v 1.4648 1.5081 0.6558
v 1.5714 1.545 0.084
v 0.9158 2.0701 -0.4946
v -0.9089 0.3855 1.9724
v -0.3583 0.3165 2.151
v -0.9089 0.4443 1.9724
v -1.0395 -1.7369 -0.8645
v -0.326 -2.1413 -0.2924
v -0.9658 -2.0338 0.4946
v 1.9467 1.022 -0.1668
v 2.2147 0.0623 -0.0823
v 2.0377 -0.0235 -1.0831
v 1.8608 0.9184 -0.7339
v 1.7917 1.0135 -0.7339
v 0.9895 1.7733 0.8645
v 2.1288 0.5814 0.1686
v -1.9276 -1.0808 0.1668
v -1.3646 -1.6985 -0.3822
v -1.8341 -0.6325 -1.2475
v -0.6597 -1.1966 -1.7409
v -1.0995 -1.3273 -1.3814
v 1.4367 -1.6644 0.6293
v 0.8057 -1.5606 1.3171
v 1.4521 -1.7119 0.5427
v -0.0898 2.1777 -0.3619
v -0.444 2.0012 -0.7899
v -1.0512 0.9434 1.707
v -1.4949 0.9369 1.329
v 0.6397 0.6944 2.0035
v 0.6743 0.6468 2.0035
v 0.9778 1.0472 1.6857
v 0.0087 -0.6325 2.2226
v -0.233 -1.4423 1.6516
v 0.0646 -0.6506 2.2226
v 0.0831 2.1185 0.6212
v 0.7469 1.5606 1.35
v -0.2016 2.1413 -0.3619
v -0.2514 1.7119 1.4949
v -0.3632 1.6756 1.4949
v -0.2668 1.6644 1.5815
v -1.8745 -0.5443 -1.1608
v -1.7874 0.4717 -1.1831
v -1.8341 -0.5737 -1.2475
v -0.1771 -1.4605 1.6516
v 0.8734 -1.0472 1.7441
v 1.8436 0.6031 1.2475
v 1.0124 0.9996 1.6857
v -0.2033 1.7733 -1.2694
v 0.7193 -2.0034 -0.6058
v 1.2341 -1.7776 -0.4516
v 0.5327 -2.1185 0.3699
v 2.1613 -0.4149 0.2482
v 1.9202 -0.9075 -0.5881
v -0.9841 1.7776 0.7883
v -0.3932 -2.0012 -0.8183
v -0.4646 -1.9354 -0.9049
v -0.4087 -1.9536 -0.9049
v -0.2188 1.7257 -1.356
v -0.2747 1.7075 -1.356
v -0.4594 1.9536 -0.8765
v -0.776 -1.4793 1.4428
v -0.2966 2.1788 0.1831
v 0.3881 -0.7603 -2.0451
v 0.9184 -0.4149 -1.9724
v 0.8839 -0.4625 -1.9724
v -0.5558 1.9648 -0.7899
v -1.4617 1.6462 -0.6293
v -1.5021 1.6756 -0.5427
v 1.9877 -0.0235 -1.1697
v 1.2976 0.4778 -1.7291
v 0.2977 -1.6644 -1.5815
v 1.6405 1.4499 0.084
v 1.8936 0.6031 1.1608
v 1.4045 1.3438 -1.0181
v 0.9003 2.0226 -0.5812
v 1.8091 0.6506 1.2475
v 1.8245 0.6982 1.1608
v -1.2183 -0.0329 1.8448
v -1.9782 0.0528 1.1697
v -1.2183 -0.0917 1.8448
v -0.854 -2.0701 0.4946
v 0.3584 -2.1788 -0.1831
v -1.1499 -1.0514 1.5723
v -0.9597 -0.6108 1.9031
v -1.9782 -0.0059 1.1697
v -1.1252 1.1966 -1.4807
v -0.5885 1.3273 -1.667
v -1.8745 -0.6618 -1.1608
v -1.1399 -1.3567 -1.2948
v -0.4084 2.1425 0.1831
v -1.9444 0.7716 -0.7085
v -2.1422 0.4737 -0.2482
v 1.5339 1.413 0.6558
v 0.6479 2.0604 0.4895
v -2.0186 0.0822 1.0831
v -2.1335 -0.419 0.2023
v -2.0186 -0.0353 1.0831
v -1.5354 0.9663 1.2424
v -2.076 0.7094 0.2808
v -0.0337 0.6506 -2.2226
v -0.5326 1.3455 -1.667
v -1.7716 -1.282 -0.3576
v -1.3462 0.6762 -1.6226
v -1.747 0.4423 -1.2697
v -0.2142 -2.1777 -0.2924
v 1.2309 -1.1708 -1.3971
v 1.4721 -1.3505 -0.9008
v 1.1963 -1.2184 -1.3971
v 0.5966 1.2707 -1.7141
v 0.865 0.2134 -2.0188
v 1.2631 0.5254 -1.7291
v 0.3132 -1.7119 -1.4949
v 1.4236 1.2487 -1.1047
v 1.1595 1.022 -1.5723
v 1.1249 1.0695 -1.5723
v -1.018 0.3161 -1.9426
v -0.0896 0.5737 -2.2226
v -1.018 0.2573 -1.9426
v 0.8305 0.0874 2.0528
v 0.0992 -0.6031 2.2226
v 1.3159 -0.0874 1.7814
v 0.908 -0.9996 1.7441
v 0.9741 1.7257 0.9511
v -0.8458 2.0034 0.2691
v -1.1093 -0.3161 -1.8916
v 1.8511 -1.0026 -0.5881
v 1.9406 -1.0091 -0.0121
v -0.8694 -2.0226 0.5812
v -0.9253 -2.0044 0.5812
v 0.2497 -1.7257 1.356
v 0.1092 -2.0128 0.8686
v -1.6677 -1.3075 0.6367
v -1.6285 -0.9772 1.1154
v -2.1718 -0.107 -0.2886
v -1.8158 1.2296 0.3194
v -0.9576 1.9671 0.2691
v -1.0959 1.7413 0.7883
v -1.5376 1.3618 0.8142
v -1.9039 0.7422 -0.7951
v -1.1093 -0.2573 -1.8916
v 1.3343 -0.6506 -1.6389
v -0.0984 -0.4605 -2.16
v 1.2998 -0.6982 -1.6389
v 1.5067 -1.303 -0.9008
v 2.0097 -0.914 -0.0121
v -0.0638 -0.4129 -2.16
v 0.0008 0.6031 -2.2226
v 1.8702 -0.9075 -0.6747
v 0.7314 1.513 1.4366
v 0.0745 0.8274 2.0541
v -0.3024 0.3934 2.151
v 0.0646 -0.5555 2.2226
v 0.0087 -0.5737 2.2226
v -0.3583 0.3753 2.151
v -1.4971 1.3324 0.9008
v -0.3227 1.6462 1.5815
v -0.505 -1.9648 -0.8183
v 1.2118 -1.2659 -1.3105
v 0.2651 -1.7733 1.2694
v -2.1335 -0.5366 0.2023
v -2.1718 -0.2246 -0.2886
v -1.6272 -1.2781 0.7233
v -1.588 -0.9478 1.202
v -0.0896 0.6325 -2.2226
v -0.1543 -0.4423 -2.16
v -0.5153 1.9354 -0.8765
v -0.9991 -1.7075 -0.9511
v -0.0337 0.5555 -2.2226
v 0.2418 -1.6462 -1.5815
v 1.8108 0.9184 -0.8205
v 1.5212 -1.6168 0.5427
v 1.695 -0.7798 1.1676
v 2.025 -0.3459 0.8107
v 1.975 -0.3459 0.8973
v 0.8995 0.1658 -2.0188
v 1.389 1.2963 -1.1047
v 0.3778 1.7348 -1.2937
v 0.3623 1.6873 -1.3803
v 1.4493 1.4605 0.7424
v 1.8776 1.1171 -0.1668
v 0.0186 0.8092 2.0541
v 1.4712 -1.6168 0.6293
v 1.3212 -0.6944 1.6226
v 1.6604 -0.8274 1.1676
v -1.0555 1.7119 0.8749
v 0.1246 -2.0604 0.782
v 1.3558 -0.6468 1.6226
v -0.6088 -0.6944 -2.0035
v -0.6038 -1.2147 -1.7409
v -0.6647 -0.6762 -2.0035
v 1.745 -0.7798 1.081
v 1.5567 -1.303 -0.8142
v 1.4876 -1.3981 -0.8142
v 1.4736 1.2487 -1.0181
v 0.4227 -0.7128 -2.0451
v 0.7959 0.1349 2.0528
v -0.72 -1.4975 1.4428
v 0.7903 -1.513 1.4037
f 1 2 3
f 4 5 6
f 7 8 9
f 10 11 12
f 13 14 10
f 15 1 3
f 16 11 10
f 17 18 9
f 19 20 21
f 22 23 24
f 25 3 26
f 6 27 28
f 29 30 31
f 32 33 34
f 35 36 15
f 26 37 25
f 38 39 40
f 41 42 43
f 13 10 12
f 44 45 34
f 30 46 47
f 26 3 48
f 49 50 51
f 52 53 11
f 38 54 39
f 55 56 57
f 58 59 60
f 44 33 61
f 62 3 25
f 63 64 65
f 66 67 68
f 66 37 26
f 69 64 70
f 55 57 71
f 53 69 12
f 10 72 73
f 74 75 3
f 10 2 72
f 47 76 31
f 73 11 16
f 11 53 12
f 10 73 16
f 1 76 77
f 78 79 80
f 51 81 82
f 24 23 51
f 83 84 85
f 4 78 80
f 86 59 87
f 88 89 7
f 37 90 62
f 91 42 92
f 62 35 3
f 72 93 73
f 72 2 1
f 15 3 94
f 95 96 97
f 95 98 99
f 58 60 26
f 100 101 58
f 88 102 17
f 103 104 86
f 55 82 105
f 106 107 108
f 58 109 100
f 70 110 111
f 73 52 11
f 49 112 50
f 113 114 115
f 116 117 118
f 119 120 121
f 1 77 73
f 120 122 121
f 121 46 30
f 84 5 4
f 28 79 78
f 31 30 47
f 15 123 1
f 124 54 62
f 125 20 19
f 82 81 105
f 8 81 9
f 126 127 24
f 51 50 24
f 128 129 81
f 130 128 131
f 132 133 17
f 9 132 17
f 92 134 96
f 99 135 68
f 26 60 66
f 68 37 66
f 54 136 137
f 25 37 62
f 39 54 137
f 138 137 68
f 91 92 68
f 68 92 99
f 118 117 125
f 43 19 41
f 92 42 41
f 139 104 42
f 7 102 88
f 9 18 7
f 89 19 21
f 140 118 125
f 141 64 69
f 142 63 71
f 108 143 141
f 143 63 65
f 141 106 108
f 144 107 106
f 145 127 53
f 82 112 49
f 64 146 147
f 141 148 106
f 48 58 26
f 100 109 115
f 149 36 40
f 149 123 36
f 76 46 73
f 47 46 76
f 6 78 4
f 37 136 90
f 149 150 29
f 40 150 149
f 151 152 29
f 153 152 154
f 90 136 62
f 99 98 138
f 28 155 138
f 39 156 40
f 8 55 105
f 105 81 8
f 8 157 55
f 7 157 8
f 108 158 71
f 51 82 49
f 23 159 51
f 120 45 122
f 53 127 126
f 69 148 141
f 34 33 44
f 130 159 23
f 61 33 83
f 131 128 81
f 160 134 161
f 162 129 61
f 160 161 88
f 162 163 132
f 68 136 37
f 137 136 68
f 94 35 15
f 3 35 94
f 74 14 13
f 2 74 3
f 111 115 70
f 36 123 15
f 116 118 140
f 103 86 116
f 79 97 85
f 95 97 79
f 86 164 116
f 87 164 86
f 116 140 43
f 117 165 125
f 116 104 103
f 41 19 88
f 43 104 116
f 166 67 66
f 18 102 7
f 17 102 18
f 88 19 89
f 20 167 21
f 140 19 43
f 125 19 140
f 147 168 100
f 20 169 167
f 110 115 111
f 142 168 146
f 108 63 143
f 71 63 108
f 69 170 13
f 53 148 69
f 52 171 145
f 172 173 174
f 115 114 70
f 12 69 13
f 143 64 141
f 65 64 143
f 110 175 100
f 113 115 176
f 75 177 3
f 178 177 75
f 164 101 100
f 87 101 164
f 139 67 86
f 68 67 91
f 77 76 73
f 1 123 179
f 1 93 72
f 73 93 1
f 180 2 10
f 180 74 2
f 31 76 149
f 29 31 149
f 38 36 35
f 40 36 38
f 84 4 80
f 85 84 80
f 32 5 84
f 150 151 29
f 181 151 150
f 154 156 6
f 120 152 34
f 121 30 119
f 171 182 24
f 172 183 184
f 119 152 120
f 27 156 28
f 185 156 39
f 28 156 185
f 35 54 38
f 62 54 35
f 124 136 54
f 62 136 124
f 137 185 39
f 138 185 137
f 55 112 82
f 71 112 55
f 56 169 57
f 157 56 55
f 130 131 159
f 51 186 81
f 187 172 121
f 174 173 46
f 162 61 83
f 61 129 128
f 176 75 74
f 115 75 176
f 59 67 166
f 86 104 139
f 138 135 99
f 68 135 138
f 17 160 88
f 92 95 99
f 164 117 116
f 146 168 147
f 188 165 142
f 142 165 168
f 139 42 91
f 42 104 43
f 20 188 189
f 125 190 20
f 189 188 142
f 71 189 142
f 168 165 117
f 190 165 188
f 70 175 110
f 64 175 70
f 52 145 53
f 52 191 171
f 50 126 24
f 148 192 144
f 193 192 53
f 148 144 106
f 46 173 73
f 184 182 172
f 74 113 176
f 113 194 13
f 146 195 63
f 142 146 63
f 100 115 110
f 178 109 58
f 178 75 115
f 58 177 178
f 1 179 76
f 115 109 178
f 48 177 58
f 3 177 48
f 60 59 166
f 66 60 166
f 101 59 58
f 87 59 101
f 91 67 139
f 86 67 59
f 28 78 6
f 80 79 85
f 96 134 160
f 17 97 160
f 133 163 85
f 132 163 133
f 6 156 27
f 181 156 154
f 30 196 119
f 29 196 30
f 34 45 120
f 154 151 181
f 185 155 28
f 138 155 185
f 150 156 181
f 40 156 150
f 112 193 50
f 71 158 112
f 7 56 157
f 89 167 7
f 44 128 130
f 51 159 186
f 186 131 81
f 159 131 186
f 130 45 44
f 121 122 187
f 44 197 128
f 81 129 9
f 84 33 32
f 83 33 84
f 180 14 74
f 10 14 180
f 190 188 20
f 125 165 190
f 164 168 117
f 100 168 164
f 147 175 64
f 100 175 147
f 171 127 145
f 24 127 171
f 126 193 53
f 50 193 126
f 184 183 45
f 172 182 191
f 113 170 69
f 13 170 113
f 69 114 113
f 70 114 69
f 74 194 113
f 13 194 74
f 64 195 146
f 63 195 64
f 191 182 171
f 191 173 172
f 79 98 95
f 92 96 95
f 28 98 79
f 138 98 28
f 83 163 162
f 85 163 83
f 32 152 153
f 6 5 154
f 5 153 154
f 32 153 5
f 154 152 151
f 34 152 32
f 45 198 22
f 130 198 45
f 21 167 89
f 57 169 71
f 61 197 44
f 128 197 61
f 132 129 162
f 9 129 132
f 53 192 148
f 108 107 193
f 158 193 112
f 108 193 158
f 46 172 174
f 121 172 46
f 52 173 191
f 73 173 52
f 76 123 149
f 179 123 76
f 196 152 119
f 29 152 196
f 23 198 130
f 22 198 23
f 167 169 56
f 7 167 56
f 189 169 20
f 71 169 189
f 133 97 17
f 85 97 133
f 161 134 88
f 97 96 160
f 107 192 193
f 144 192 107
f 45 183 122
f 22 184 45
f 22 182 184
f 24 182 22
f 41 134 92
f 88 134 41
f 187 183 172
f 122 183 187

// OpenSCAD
// Auto-generated OpenSCAD file

    inner_points = [[0.8579796441232708, -0.9996404489940665, 1.6574581918866056], [-1.0847386016059772, 1.167184379355083, -1.3941307491129977], [0.7748474244999852, -1.4654565366556, 1.3170521488407676], [-0.5480884670172788, 1.2979126062945836, -1.5803795916143755], [-1.0107543103972276, 0.9139857219760192, 1.6203652609471635], [-1.4544672778702694, 0.9074766744572665, 1.242412482940991], [1.180871812766946, -1.1708139864972764, -1.310463324813721], [1.2843497755005513, -0.6506484099360094, -1.5523144190744336], [1.433879238504469, 1.4129540896823205, 0.6558420729739887], [-1.6907204848573856, -1.223183452303766, -0.35758109421614703], [-1.2836865882402133, -1.6397015858181634, -0.3822371089841631], [1.54052783459313, 1.4499309484396088, 0.08397613022632147], [1.305769091672327, -0.646800027074129, 1.5359669785047796], [-0.23423381422719303, 1.6781592990996514, -1.2694461949861906], [0.23423381422719303, -1.6781592990996514, 1.2694461949861906], [-1.305769091672327, 0.646800027074129, -1.5359669785047796], [-0.8684240390048409, 0.41492955636205053, 1.8858024569351586], [-1.4566528062848514, 1.3029849964993816, 0.8142299771483135], [1.4566528062848514, -1.3029849964993816, -0.8142299771483135], [0.8684240390048409, -0.41492955636205053, -1.8858024569351586], [0.9586077240253138, 1.678159299100078, 0.8645405445263475], [-1.8467080524705957, -1.0219743296750887, 0.16678007456642885], [1.8467080524705957, 1.0219743296750887, -0.16678007456642885], [-0.9586077240253138, -1.678159299100078, -0.8645405445263475], [0.04918492172195882, -0.6030673945114334, 2.135952636513539], [-1.421213547504029, 1.61680934800795, -0.5426625920973938], [1.421213547504029, -1.61680934800795, 0.5426625920973938], [-0.04918492172195882, 0.6030673945114334, -2.135952636513539], [-0.2822855849940039, 1.6168093480083572, 1.4948730665090353], [-1.9377033650591966, 0.023459588570722167, 1.0831243792931171], [1.9377033650591966, -0.023459588570722167, -1.0831243792931171], [0.2822855849940039, -1.6168093480083572, -1.4948730665090353], [1.7936392323569286, 0.6030673945120921, 1.1608493124015653], [0.8848830013694515, 1.9750266722244698, -0.49462594166306073], [-0.8848830013694515, -1.9750266722244698, 0.49462594166306073], [-1.7936392323569286, -0.6030673945120921, -1.1608493124015653], [-0.1925143734426863, -1.4129540896818769, 1.5649526227065784], [-0.4748715378173711, 1.9060612193025719, -0.7899401279139628], [1.6449700533810556, -0.7798342264897309, 1.0809763445708047], [-0.9775841421209983, 0.286727096869036, -1.8559888393634203], [-1.1778980317856296, -0.06226494218894019, 1.758197104575229], [-1.0150011226881364, 1.6825182159935905, 0.788341885629921], [1.8202339603303983, -0.9074766744571358, -0.5880579646795898], [0.3726651941433674, -0.7127765993475144, -1.95848102552556], [-1.586794026674212, -1.248721825810892, 0.6366759564342929], [0.6170033927502129, 1.965264785077761, 0.48950882802556095], [2.0288337144286324, 0.5813696470282894, 0.16858483786773926], [-1.0590430805046331, -1.2979126062951583, -1.294769622327593], [1.2658949203529903, -0.08738587161821454, 1.6948308219149752], [-1.7065218741303412, 0.412949070877893, -1.183145769895968], [0.09373659686164326, -1.965264785077507, 0.7820009781260046], [0.3468903569157078, 1.6397015858178283, -1.293686030145012], [-0.31788214871213094, 0.3458914437357179, 2.0644340152999683], [-1.7348722627838298, 1.1708139864970786, 0.3193596651004992], [1.2032348902448913, -1.682518215993523, -0.45159274417810036], [0.8495195212510696, 0.1658127857607266, -1.932200936222367], [0.7159492568414045, 1.4654565366561332, 1.3499746500016296], [-2.052643591225915, -0.477821803456394, 0.20228288703651476], [-0.42410221935124015, -1.9060612193028932, -0.8183188196894232], [1.7607965537357508, 0.918426486103154, -0.7339387173487212], [0.7804980979127955, 0.08738587161894618, 1.9661546692574507], [-1.8634618754847572, 0.7127765993469813, -0.7085457733168372], [0.5018400796558556, -2.023345923269297, 0.3698723618864901], [0.5811236979161059, 1.2231834523033696, -1.6274812578271036], [0.05903185699155861, 0.7798342264903401, 1.9674733985244406], [-1.995089765112408, 0.6506484099357557, 0.28080461292286785], [0.6884424700989371, -1.908304439882202, -0.6058043289189347], [1.2476154380219122, 0.4778218034561063, -1.6424736825283737], [0.9623571324298653, 0.9996404489947172, 1.5991139663082108], [-2.0908843863128523, -0.1658127857611702, -0.2885937594582003], [-0.2450615437600009, -2.0825494890443625, -0.2924213061628696], [1.3735887976429877, 1.248721825810816, -1.0180989006871408], [-0.7354996813891271, -1.4499309484393212, 1.3562146652655374], [-0.12070513870012811, 2.0825494890442324, -0.3619332120985318], [1.9250136962340425, -0.34589144373514324, 0.8107151986420003], [-1.0688088761447874, -0.28672709686976783, -1.804996651809006], [-0.9192369274873521, -0.5813696470278928, 1.8164775141755118], [-0.876676237655692, 1.9083044398821347, 0.269055187467114], [1.9097280675658392, -0.913985721975698, -0.01210631334377732], [-0.11381490242279513, -0.4129490708785438, -2.0734263882988486], [-1.547591324704526, -0.9184264861030778, 1.1153616616015691], [0.05216037036102794, 2.0233459232694946, 0.6212312978267318], [2.1146942631101355, 0.06226494218927503, -0.08227396544605348], [-0.6192633087666373, -1.1671843793556922, -1.6543189939822476], [0.6242890604129371, 0.6468000270748188, 1.9168960975680756], [-0.32748507820657213, 2.0837039131112682, 0.18305540386395025], [-1.1094914386378385, -1.0219743296748254, 1.4856564111267456], [-2.0612655772573483, 0.4149295563616243, -0.24818428257737968], [2.0612655772573483, -0.4149295563616243, 0.24818428257737968], [1.1094914386378385, 1.0219743296748254, -1.4856564111267456], [0.32748507820657213, -2.0837039131112682, -0.18305540386395025], [-0.6242890604129371, -0.6468000270748188, -1.9168960975680756]];

    outer_points = [[-1.0150011226877154, 1.6825182159936665, 0.7883418856303], [1.2032348902445347, -1.6825182159936665, -0.45159274417851536], [-0.8766762376553342, 1.9083044398822455, 0.2690551874674916], [0.6884424700985147, -1.9083044398822455, -0.6058043289192763], [0.7804980979131853, 0.0873858716186044, 1.966154669257311], [1.2658949203533, -0.0873858716186044, 1.6948308219147237], [-0.9775841421213071, 0.2867270968693973, -1.8559888393632018], [-1.0688088761451784, -0.2867270968693973, -1.804996651808833], [-1.5475913247044601, -0.9184264861029521, 1.1153616616017636], [1.760796553735758, 0.9184264861029521, -0.7339387173489564], [1.3735887976429932, 1.2487218258107073, -1.0180989006872658], [-1.586794026674291, -1.2487218258107073, 0.6366759564344586], [-1.456652806284487, 1.302984996499526, 0.8142299771487352], [0.32748507820620276, -2.0837039131113007, -0.18305540386424204], [-0.32748507820620276, 2.0837039131113007, 0.18305540386424204], [1.456652806284487, -1.302984996499526, -0.8142299771487352], [0.6242890604134071, 0.6468000270745078, 1.9168960975680274], [1.3057690916725169, -0.6468000270745078, 1.535966978504459], [-1.3057690916725169, 0.6468000270745078, -1.535966978504459], [-0.6242890604134071, -0.6468000270745078, -1.9168960975680274], [-1.1094914386377184, -1.0219743296748105, 1.485656411126845], [1.8467080524707278, 1.0219743296748105, -0.1667800745666691], [-1.8467080524707278, -1.0219743296748105, 0.1667800745666691], [1.1094914386377184, 1.0219743296748105, -1.485656411126845], [-0.28228558499345835, 1.616809348008238, 1.494873066509267], [1.4212135475038732, -1.616809348008238, 0.5426625920969443], [-1.4212135475038732, 1.616809348008238, -0.5426625920969443], [0.28228558499345835, -1.616809348008238, -1.494873066509267], [0.04918492172227007, -0.6030673945116763, 2.135952636513463], [1.793639232357247, 0.6030673945116763, 1.1608493124012889], [-1.793639232357247, -0.6030673945116763, -1.1608493124012889], [-0.04918492172227007, 0.6030673945116763, -2.135952636513463], [-1.9377033650589857, 0.023459588570914014, 1.0831243792934901], [-0.8848830013696743, -1.975026672224382, 0.4946259416630126], [0.8848830013696743, 1.975026672224382, -0.4946259416630126], [1.9377033650589857, -0.023459588570914014, -1.0831243792934901], [0.0521603703614715, 2.023345923269418, 0.6212312978269446], [0.5018400796556018, -2.023345923269418, 0.36987236188617156], [-1.734872262783581, 1.170813986497322, 0.3193596651009595], [1.1808718127665079, -1.170813986497322, -1.3104633248140756], [0.9623571324303317, 0.9996404489943866, 1.5991139663081368], [0.8579796441234271, -0.9996404489943866, 1.657458191886332], [-1.706521874130501, 0.41294907087829724, -1.1831457698955965], [-0.11381490242325776, -0.41294907087829724, -2.073426388298872], [1.5405278345933788, 1.4499309484393523, 0.08397613022618677], [-0.7354996813891006, -1.4499309484393523, 1.3562146652655183], [-2.0526435912259533, -0.47782180345608677, 0.2022828870368545], [1.247615438021675, 0.47782180345608677, -1.6424736825285595], [-1.4544672778698864, 0.9074766744573634, 1.242412482941369], [1.8202339603301403, -0.9074766744573634, -0.5880579646800377], [-0.12070513869986292, 2.0825494890442915, -0.3619332120982795], [-0.2450615437603909, -2.0825494890442915, -0.2924213061630519], [0.05903185699205982, 0.7798342264901141, 1.967473398524515], [1.6449700533811373, -0.7798342264901141, 1.0809763445704046], [-1.0847386016060563, 1.1671843793554106, -1.3941307491126622], [-0.6192633087671408, -1.1671843793554106, -1.6543189939822573], [-0.9192369274870983, -0.581369647027945, 1.8164775141756233], [2.0288337144287576, 0.581369647027945, 0.1685848378674154], [0.5811236979159912, 1.2231834523034553, -1.62748125782708], [-1.6907204848576507, -1.2231834523034553, -0.35758109421595863], [-1.0107543103967713, 0.9139857219760035, 1.6203652609474573], [1.9097280675656902, -0.9139857219760035, -0.012106313344242725], [-0.4748715378172161, 1.906061219302735, -0.7899401279136625], [-0.4241022193517027, -1.906061219302735, -0.818318819689552], [-0.31788214871168086, 0.34589144373554176, 2.0644340153000673], [1.9250136962341422, -0.34589144373554176, 0.8107151986415944], [-0.5480884670173723, 1.2979126062948456, -1.580379591614128], [-1.0590430805050888, -1.2979126062948456, -1.2947696223275336], [-1.1778980317853036, -0.062264942188944516, 1.7581971045754474], [2.1146942631101298, 0.062264942188944516, -0.08227396544645094], [0.3468903569157235, 1.6397015858179154, -1.293686030144898], [-1.2836865882405497, -1.6397015858179154, -0.38223710898409835], [0.6170033927506222, 1.9652647850776082, 0.4895088280256593], [0.09373659686147723, -1.9652647850776082, 0.7820009781257705], [-1.9950897651122497, 0.6506484099360449, 0.2808046129233208], [1.28434977550015, -0.6506484099360449, -1.5523144190747507], [0.7159492568418979, 1.4654565366558696, 1.349974650001654], [0.7748474245000014, -1.4654565366558696, 1.3170521488404583], [-1.863461875484778, 0.7127765993473587, -0.7085457733164026], [0.3726651941428787, -0.7127765993473587, -1.95848102552571], [1.4338792385048214, 1.4129540896820183, 0.6558420729738703], [-0.19251437344261413, -1.4129540896820183, 1.56495262270646], [-2.090884386312934, -0.16581278576080272, -0.28859375945781907], [0.8495195212507268, 0.16581278576080272, -1.9322009362225114], [-0.8684240390044139, 0.4149295563619826, 1.8858024569353704], [0.23423381422716621, -1.6781592990998289, 1.2694461949859612], [0.9586077240257487, 1.6781592990998289, 0.864540544526349], [2.0612655772573287, -0.4149295563619826, 0.24818428257693992], [-2.0612655772573287, 0.4149295563619826, -0.24818428257693992], [-0.9586077240257487, -1.6781592990998289, -0.864540544526349], [-0.23423381422716621, 1.6781592990998289, -1.2694461949859612], [0.8684240390044139, -0.4149295563619826, -1.8858024569353704]];

    // Convex hull for inner set (I)
    module inner_hull() {
        hull() {
            for (p = inner_points) {
                translate(p) sphere(r=0.1);
            }
        }
    }

    // Convex hull for outer set (O) minus inner hull (O \ I)
    module outer_minus_inner() {
        difference() {
            hull() {
                for (p = outer_points) {
                    translate(p) sphere(r=0.1);
                }
            }
            inner_hull(); // Subtract inner hull
        }
    }

    // Convex hull for outer set (O) minus all translated inner hulls
    module outer_minus_AllTranslationInner() {
        difference() {
            hull() {
                for (p = outer_points) {
                    translate(p) sphere(r=0.1);
                }
            }
            hull() {
                translate([0,0,5]) inner_hull();
                translate([0,0,-5]) inner_hull();
            }; // Subtract translated inner hulls
        }
    }

    // Difference between outer_minus_inner and outer_minus_AllTranslationInner
    module outer_minus_inner_diff() {
        difference() {
            // Outer minus inner
            difference() {
                hull() {
                    for (p = outer_points) {
                        translate(p) sphere(r=0.1);
                    }
                }
                inner_hull();
            }

            // Subtract Outer minus AllTranslationInner
            difference() {
                hull() {
                    for (p = outer_points) {
                        translate(p) sphere(r=0.1);
                    }
                }
                hull() {
                    translate([0,0,5]) inner_hull();
                    translate([0,0,-5]) inner_hull();
                };
            }
        }
    }

    // Rendering all with colors applied
    color([1, 0, 0, 0.5]) inner_hull(); // Transparent red
    color([0, 0, 1, 1]) outer_minus_inner(); // Opaque blue
    color([0, 1, 0, 1]) outer_minus_AllTranslationInner(); // Opaque green
    color([1, 1, 0, 1]) outer_minus_inner_diff(); // Opaque yellow
    
